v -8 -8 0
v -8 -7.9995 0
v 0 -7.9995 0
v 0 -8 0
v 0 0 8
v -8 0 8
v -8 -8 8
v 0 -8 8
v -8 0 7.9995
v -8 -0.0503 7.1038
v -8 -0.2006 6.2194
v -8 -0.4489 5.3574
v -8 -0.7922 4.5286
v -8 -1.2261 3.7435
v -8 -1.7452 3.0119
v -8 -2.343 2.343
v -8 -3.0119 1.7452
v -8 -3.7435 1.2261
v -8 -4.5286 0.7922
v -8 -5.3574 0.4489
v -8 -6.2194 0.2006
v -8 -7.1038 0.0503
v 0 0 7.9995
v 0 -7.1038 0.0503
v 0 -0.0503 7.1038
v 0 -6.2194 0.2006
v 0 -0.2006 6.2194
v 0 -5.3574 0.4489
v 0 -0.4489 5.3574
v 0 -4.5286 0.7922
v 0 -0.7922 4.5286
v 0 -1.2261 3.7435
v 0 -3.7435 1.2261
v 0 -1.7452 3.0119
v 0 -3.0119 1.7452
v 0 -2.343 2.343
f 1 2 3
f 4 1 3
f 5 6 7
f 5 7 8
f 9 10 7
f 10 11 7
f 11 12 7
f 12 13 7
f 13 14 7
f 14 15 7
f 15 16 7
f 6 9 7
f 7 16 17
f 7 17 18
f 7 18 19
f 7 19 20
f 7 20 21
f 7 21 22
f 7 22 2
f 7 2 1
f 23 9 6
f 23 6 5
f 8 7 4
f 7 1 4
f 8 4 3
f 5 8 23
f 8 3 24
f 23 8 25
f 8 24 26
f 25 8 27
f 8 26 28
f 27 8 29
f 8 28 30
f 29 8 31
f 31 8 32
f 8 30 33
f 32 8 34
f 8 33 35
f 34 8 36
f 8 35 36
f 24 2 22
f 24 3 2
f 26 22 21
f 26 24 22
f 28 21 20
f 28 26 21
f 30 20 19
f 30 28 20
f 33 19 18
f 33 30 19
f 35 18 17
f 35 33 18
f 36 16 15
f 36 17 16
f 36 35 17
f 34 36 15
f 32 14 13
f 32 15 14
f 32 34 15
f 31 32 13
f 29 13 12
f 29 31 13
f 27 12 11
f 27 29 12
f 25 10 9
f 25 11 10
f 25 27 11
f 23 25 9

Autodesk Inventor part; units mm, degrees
ref_plane "YZ Plane" through (0, 0, 0) normal (1, 0, 0) x (0, 1, 0)
ref_plane "XZ Plane" through (0, 0, 0) normal (0, 1, 0) x (-1, 0, 0)
ref_plane "XY Plane" through (0, 0, 0) normal (0, 0, 1) x (1, 0, 0)
sketch "Skizze1" plane through (0, 0, 0) normal (0, 0, 1) x (1, 0, 0)
  line L0 (-9.6, 0) -> (1.6, 0) projected
  line L1 (0, -9.6) -> (0, 1.6) projected
  line L2 (0, 0) -> (-8, 0)
  line L3 (-8, 0) -> (-8, -8)
  line L4 (-8, -8) -> (0, -8)
  line L5 (0, -8) -> (0, 0)
  point P0 (0, -8)
  point P1 (-8, 0)
  point P2 (0, -8)
  dimension "d0" = 8
  dimension "d1" = 8
extrude "Extrusion1" add sketch "Skizze1" along normal blind 8
fillet "Rundung2" radius 8 1 edges at (-4, 0, 0)
properties part number "Eihalter_Halter" material "Acetalharz, Schwarz"
